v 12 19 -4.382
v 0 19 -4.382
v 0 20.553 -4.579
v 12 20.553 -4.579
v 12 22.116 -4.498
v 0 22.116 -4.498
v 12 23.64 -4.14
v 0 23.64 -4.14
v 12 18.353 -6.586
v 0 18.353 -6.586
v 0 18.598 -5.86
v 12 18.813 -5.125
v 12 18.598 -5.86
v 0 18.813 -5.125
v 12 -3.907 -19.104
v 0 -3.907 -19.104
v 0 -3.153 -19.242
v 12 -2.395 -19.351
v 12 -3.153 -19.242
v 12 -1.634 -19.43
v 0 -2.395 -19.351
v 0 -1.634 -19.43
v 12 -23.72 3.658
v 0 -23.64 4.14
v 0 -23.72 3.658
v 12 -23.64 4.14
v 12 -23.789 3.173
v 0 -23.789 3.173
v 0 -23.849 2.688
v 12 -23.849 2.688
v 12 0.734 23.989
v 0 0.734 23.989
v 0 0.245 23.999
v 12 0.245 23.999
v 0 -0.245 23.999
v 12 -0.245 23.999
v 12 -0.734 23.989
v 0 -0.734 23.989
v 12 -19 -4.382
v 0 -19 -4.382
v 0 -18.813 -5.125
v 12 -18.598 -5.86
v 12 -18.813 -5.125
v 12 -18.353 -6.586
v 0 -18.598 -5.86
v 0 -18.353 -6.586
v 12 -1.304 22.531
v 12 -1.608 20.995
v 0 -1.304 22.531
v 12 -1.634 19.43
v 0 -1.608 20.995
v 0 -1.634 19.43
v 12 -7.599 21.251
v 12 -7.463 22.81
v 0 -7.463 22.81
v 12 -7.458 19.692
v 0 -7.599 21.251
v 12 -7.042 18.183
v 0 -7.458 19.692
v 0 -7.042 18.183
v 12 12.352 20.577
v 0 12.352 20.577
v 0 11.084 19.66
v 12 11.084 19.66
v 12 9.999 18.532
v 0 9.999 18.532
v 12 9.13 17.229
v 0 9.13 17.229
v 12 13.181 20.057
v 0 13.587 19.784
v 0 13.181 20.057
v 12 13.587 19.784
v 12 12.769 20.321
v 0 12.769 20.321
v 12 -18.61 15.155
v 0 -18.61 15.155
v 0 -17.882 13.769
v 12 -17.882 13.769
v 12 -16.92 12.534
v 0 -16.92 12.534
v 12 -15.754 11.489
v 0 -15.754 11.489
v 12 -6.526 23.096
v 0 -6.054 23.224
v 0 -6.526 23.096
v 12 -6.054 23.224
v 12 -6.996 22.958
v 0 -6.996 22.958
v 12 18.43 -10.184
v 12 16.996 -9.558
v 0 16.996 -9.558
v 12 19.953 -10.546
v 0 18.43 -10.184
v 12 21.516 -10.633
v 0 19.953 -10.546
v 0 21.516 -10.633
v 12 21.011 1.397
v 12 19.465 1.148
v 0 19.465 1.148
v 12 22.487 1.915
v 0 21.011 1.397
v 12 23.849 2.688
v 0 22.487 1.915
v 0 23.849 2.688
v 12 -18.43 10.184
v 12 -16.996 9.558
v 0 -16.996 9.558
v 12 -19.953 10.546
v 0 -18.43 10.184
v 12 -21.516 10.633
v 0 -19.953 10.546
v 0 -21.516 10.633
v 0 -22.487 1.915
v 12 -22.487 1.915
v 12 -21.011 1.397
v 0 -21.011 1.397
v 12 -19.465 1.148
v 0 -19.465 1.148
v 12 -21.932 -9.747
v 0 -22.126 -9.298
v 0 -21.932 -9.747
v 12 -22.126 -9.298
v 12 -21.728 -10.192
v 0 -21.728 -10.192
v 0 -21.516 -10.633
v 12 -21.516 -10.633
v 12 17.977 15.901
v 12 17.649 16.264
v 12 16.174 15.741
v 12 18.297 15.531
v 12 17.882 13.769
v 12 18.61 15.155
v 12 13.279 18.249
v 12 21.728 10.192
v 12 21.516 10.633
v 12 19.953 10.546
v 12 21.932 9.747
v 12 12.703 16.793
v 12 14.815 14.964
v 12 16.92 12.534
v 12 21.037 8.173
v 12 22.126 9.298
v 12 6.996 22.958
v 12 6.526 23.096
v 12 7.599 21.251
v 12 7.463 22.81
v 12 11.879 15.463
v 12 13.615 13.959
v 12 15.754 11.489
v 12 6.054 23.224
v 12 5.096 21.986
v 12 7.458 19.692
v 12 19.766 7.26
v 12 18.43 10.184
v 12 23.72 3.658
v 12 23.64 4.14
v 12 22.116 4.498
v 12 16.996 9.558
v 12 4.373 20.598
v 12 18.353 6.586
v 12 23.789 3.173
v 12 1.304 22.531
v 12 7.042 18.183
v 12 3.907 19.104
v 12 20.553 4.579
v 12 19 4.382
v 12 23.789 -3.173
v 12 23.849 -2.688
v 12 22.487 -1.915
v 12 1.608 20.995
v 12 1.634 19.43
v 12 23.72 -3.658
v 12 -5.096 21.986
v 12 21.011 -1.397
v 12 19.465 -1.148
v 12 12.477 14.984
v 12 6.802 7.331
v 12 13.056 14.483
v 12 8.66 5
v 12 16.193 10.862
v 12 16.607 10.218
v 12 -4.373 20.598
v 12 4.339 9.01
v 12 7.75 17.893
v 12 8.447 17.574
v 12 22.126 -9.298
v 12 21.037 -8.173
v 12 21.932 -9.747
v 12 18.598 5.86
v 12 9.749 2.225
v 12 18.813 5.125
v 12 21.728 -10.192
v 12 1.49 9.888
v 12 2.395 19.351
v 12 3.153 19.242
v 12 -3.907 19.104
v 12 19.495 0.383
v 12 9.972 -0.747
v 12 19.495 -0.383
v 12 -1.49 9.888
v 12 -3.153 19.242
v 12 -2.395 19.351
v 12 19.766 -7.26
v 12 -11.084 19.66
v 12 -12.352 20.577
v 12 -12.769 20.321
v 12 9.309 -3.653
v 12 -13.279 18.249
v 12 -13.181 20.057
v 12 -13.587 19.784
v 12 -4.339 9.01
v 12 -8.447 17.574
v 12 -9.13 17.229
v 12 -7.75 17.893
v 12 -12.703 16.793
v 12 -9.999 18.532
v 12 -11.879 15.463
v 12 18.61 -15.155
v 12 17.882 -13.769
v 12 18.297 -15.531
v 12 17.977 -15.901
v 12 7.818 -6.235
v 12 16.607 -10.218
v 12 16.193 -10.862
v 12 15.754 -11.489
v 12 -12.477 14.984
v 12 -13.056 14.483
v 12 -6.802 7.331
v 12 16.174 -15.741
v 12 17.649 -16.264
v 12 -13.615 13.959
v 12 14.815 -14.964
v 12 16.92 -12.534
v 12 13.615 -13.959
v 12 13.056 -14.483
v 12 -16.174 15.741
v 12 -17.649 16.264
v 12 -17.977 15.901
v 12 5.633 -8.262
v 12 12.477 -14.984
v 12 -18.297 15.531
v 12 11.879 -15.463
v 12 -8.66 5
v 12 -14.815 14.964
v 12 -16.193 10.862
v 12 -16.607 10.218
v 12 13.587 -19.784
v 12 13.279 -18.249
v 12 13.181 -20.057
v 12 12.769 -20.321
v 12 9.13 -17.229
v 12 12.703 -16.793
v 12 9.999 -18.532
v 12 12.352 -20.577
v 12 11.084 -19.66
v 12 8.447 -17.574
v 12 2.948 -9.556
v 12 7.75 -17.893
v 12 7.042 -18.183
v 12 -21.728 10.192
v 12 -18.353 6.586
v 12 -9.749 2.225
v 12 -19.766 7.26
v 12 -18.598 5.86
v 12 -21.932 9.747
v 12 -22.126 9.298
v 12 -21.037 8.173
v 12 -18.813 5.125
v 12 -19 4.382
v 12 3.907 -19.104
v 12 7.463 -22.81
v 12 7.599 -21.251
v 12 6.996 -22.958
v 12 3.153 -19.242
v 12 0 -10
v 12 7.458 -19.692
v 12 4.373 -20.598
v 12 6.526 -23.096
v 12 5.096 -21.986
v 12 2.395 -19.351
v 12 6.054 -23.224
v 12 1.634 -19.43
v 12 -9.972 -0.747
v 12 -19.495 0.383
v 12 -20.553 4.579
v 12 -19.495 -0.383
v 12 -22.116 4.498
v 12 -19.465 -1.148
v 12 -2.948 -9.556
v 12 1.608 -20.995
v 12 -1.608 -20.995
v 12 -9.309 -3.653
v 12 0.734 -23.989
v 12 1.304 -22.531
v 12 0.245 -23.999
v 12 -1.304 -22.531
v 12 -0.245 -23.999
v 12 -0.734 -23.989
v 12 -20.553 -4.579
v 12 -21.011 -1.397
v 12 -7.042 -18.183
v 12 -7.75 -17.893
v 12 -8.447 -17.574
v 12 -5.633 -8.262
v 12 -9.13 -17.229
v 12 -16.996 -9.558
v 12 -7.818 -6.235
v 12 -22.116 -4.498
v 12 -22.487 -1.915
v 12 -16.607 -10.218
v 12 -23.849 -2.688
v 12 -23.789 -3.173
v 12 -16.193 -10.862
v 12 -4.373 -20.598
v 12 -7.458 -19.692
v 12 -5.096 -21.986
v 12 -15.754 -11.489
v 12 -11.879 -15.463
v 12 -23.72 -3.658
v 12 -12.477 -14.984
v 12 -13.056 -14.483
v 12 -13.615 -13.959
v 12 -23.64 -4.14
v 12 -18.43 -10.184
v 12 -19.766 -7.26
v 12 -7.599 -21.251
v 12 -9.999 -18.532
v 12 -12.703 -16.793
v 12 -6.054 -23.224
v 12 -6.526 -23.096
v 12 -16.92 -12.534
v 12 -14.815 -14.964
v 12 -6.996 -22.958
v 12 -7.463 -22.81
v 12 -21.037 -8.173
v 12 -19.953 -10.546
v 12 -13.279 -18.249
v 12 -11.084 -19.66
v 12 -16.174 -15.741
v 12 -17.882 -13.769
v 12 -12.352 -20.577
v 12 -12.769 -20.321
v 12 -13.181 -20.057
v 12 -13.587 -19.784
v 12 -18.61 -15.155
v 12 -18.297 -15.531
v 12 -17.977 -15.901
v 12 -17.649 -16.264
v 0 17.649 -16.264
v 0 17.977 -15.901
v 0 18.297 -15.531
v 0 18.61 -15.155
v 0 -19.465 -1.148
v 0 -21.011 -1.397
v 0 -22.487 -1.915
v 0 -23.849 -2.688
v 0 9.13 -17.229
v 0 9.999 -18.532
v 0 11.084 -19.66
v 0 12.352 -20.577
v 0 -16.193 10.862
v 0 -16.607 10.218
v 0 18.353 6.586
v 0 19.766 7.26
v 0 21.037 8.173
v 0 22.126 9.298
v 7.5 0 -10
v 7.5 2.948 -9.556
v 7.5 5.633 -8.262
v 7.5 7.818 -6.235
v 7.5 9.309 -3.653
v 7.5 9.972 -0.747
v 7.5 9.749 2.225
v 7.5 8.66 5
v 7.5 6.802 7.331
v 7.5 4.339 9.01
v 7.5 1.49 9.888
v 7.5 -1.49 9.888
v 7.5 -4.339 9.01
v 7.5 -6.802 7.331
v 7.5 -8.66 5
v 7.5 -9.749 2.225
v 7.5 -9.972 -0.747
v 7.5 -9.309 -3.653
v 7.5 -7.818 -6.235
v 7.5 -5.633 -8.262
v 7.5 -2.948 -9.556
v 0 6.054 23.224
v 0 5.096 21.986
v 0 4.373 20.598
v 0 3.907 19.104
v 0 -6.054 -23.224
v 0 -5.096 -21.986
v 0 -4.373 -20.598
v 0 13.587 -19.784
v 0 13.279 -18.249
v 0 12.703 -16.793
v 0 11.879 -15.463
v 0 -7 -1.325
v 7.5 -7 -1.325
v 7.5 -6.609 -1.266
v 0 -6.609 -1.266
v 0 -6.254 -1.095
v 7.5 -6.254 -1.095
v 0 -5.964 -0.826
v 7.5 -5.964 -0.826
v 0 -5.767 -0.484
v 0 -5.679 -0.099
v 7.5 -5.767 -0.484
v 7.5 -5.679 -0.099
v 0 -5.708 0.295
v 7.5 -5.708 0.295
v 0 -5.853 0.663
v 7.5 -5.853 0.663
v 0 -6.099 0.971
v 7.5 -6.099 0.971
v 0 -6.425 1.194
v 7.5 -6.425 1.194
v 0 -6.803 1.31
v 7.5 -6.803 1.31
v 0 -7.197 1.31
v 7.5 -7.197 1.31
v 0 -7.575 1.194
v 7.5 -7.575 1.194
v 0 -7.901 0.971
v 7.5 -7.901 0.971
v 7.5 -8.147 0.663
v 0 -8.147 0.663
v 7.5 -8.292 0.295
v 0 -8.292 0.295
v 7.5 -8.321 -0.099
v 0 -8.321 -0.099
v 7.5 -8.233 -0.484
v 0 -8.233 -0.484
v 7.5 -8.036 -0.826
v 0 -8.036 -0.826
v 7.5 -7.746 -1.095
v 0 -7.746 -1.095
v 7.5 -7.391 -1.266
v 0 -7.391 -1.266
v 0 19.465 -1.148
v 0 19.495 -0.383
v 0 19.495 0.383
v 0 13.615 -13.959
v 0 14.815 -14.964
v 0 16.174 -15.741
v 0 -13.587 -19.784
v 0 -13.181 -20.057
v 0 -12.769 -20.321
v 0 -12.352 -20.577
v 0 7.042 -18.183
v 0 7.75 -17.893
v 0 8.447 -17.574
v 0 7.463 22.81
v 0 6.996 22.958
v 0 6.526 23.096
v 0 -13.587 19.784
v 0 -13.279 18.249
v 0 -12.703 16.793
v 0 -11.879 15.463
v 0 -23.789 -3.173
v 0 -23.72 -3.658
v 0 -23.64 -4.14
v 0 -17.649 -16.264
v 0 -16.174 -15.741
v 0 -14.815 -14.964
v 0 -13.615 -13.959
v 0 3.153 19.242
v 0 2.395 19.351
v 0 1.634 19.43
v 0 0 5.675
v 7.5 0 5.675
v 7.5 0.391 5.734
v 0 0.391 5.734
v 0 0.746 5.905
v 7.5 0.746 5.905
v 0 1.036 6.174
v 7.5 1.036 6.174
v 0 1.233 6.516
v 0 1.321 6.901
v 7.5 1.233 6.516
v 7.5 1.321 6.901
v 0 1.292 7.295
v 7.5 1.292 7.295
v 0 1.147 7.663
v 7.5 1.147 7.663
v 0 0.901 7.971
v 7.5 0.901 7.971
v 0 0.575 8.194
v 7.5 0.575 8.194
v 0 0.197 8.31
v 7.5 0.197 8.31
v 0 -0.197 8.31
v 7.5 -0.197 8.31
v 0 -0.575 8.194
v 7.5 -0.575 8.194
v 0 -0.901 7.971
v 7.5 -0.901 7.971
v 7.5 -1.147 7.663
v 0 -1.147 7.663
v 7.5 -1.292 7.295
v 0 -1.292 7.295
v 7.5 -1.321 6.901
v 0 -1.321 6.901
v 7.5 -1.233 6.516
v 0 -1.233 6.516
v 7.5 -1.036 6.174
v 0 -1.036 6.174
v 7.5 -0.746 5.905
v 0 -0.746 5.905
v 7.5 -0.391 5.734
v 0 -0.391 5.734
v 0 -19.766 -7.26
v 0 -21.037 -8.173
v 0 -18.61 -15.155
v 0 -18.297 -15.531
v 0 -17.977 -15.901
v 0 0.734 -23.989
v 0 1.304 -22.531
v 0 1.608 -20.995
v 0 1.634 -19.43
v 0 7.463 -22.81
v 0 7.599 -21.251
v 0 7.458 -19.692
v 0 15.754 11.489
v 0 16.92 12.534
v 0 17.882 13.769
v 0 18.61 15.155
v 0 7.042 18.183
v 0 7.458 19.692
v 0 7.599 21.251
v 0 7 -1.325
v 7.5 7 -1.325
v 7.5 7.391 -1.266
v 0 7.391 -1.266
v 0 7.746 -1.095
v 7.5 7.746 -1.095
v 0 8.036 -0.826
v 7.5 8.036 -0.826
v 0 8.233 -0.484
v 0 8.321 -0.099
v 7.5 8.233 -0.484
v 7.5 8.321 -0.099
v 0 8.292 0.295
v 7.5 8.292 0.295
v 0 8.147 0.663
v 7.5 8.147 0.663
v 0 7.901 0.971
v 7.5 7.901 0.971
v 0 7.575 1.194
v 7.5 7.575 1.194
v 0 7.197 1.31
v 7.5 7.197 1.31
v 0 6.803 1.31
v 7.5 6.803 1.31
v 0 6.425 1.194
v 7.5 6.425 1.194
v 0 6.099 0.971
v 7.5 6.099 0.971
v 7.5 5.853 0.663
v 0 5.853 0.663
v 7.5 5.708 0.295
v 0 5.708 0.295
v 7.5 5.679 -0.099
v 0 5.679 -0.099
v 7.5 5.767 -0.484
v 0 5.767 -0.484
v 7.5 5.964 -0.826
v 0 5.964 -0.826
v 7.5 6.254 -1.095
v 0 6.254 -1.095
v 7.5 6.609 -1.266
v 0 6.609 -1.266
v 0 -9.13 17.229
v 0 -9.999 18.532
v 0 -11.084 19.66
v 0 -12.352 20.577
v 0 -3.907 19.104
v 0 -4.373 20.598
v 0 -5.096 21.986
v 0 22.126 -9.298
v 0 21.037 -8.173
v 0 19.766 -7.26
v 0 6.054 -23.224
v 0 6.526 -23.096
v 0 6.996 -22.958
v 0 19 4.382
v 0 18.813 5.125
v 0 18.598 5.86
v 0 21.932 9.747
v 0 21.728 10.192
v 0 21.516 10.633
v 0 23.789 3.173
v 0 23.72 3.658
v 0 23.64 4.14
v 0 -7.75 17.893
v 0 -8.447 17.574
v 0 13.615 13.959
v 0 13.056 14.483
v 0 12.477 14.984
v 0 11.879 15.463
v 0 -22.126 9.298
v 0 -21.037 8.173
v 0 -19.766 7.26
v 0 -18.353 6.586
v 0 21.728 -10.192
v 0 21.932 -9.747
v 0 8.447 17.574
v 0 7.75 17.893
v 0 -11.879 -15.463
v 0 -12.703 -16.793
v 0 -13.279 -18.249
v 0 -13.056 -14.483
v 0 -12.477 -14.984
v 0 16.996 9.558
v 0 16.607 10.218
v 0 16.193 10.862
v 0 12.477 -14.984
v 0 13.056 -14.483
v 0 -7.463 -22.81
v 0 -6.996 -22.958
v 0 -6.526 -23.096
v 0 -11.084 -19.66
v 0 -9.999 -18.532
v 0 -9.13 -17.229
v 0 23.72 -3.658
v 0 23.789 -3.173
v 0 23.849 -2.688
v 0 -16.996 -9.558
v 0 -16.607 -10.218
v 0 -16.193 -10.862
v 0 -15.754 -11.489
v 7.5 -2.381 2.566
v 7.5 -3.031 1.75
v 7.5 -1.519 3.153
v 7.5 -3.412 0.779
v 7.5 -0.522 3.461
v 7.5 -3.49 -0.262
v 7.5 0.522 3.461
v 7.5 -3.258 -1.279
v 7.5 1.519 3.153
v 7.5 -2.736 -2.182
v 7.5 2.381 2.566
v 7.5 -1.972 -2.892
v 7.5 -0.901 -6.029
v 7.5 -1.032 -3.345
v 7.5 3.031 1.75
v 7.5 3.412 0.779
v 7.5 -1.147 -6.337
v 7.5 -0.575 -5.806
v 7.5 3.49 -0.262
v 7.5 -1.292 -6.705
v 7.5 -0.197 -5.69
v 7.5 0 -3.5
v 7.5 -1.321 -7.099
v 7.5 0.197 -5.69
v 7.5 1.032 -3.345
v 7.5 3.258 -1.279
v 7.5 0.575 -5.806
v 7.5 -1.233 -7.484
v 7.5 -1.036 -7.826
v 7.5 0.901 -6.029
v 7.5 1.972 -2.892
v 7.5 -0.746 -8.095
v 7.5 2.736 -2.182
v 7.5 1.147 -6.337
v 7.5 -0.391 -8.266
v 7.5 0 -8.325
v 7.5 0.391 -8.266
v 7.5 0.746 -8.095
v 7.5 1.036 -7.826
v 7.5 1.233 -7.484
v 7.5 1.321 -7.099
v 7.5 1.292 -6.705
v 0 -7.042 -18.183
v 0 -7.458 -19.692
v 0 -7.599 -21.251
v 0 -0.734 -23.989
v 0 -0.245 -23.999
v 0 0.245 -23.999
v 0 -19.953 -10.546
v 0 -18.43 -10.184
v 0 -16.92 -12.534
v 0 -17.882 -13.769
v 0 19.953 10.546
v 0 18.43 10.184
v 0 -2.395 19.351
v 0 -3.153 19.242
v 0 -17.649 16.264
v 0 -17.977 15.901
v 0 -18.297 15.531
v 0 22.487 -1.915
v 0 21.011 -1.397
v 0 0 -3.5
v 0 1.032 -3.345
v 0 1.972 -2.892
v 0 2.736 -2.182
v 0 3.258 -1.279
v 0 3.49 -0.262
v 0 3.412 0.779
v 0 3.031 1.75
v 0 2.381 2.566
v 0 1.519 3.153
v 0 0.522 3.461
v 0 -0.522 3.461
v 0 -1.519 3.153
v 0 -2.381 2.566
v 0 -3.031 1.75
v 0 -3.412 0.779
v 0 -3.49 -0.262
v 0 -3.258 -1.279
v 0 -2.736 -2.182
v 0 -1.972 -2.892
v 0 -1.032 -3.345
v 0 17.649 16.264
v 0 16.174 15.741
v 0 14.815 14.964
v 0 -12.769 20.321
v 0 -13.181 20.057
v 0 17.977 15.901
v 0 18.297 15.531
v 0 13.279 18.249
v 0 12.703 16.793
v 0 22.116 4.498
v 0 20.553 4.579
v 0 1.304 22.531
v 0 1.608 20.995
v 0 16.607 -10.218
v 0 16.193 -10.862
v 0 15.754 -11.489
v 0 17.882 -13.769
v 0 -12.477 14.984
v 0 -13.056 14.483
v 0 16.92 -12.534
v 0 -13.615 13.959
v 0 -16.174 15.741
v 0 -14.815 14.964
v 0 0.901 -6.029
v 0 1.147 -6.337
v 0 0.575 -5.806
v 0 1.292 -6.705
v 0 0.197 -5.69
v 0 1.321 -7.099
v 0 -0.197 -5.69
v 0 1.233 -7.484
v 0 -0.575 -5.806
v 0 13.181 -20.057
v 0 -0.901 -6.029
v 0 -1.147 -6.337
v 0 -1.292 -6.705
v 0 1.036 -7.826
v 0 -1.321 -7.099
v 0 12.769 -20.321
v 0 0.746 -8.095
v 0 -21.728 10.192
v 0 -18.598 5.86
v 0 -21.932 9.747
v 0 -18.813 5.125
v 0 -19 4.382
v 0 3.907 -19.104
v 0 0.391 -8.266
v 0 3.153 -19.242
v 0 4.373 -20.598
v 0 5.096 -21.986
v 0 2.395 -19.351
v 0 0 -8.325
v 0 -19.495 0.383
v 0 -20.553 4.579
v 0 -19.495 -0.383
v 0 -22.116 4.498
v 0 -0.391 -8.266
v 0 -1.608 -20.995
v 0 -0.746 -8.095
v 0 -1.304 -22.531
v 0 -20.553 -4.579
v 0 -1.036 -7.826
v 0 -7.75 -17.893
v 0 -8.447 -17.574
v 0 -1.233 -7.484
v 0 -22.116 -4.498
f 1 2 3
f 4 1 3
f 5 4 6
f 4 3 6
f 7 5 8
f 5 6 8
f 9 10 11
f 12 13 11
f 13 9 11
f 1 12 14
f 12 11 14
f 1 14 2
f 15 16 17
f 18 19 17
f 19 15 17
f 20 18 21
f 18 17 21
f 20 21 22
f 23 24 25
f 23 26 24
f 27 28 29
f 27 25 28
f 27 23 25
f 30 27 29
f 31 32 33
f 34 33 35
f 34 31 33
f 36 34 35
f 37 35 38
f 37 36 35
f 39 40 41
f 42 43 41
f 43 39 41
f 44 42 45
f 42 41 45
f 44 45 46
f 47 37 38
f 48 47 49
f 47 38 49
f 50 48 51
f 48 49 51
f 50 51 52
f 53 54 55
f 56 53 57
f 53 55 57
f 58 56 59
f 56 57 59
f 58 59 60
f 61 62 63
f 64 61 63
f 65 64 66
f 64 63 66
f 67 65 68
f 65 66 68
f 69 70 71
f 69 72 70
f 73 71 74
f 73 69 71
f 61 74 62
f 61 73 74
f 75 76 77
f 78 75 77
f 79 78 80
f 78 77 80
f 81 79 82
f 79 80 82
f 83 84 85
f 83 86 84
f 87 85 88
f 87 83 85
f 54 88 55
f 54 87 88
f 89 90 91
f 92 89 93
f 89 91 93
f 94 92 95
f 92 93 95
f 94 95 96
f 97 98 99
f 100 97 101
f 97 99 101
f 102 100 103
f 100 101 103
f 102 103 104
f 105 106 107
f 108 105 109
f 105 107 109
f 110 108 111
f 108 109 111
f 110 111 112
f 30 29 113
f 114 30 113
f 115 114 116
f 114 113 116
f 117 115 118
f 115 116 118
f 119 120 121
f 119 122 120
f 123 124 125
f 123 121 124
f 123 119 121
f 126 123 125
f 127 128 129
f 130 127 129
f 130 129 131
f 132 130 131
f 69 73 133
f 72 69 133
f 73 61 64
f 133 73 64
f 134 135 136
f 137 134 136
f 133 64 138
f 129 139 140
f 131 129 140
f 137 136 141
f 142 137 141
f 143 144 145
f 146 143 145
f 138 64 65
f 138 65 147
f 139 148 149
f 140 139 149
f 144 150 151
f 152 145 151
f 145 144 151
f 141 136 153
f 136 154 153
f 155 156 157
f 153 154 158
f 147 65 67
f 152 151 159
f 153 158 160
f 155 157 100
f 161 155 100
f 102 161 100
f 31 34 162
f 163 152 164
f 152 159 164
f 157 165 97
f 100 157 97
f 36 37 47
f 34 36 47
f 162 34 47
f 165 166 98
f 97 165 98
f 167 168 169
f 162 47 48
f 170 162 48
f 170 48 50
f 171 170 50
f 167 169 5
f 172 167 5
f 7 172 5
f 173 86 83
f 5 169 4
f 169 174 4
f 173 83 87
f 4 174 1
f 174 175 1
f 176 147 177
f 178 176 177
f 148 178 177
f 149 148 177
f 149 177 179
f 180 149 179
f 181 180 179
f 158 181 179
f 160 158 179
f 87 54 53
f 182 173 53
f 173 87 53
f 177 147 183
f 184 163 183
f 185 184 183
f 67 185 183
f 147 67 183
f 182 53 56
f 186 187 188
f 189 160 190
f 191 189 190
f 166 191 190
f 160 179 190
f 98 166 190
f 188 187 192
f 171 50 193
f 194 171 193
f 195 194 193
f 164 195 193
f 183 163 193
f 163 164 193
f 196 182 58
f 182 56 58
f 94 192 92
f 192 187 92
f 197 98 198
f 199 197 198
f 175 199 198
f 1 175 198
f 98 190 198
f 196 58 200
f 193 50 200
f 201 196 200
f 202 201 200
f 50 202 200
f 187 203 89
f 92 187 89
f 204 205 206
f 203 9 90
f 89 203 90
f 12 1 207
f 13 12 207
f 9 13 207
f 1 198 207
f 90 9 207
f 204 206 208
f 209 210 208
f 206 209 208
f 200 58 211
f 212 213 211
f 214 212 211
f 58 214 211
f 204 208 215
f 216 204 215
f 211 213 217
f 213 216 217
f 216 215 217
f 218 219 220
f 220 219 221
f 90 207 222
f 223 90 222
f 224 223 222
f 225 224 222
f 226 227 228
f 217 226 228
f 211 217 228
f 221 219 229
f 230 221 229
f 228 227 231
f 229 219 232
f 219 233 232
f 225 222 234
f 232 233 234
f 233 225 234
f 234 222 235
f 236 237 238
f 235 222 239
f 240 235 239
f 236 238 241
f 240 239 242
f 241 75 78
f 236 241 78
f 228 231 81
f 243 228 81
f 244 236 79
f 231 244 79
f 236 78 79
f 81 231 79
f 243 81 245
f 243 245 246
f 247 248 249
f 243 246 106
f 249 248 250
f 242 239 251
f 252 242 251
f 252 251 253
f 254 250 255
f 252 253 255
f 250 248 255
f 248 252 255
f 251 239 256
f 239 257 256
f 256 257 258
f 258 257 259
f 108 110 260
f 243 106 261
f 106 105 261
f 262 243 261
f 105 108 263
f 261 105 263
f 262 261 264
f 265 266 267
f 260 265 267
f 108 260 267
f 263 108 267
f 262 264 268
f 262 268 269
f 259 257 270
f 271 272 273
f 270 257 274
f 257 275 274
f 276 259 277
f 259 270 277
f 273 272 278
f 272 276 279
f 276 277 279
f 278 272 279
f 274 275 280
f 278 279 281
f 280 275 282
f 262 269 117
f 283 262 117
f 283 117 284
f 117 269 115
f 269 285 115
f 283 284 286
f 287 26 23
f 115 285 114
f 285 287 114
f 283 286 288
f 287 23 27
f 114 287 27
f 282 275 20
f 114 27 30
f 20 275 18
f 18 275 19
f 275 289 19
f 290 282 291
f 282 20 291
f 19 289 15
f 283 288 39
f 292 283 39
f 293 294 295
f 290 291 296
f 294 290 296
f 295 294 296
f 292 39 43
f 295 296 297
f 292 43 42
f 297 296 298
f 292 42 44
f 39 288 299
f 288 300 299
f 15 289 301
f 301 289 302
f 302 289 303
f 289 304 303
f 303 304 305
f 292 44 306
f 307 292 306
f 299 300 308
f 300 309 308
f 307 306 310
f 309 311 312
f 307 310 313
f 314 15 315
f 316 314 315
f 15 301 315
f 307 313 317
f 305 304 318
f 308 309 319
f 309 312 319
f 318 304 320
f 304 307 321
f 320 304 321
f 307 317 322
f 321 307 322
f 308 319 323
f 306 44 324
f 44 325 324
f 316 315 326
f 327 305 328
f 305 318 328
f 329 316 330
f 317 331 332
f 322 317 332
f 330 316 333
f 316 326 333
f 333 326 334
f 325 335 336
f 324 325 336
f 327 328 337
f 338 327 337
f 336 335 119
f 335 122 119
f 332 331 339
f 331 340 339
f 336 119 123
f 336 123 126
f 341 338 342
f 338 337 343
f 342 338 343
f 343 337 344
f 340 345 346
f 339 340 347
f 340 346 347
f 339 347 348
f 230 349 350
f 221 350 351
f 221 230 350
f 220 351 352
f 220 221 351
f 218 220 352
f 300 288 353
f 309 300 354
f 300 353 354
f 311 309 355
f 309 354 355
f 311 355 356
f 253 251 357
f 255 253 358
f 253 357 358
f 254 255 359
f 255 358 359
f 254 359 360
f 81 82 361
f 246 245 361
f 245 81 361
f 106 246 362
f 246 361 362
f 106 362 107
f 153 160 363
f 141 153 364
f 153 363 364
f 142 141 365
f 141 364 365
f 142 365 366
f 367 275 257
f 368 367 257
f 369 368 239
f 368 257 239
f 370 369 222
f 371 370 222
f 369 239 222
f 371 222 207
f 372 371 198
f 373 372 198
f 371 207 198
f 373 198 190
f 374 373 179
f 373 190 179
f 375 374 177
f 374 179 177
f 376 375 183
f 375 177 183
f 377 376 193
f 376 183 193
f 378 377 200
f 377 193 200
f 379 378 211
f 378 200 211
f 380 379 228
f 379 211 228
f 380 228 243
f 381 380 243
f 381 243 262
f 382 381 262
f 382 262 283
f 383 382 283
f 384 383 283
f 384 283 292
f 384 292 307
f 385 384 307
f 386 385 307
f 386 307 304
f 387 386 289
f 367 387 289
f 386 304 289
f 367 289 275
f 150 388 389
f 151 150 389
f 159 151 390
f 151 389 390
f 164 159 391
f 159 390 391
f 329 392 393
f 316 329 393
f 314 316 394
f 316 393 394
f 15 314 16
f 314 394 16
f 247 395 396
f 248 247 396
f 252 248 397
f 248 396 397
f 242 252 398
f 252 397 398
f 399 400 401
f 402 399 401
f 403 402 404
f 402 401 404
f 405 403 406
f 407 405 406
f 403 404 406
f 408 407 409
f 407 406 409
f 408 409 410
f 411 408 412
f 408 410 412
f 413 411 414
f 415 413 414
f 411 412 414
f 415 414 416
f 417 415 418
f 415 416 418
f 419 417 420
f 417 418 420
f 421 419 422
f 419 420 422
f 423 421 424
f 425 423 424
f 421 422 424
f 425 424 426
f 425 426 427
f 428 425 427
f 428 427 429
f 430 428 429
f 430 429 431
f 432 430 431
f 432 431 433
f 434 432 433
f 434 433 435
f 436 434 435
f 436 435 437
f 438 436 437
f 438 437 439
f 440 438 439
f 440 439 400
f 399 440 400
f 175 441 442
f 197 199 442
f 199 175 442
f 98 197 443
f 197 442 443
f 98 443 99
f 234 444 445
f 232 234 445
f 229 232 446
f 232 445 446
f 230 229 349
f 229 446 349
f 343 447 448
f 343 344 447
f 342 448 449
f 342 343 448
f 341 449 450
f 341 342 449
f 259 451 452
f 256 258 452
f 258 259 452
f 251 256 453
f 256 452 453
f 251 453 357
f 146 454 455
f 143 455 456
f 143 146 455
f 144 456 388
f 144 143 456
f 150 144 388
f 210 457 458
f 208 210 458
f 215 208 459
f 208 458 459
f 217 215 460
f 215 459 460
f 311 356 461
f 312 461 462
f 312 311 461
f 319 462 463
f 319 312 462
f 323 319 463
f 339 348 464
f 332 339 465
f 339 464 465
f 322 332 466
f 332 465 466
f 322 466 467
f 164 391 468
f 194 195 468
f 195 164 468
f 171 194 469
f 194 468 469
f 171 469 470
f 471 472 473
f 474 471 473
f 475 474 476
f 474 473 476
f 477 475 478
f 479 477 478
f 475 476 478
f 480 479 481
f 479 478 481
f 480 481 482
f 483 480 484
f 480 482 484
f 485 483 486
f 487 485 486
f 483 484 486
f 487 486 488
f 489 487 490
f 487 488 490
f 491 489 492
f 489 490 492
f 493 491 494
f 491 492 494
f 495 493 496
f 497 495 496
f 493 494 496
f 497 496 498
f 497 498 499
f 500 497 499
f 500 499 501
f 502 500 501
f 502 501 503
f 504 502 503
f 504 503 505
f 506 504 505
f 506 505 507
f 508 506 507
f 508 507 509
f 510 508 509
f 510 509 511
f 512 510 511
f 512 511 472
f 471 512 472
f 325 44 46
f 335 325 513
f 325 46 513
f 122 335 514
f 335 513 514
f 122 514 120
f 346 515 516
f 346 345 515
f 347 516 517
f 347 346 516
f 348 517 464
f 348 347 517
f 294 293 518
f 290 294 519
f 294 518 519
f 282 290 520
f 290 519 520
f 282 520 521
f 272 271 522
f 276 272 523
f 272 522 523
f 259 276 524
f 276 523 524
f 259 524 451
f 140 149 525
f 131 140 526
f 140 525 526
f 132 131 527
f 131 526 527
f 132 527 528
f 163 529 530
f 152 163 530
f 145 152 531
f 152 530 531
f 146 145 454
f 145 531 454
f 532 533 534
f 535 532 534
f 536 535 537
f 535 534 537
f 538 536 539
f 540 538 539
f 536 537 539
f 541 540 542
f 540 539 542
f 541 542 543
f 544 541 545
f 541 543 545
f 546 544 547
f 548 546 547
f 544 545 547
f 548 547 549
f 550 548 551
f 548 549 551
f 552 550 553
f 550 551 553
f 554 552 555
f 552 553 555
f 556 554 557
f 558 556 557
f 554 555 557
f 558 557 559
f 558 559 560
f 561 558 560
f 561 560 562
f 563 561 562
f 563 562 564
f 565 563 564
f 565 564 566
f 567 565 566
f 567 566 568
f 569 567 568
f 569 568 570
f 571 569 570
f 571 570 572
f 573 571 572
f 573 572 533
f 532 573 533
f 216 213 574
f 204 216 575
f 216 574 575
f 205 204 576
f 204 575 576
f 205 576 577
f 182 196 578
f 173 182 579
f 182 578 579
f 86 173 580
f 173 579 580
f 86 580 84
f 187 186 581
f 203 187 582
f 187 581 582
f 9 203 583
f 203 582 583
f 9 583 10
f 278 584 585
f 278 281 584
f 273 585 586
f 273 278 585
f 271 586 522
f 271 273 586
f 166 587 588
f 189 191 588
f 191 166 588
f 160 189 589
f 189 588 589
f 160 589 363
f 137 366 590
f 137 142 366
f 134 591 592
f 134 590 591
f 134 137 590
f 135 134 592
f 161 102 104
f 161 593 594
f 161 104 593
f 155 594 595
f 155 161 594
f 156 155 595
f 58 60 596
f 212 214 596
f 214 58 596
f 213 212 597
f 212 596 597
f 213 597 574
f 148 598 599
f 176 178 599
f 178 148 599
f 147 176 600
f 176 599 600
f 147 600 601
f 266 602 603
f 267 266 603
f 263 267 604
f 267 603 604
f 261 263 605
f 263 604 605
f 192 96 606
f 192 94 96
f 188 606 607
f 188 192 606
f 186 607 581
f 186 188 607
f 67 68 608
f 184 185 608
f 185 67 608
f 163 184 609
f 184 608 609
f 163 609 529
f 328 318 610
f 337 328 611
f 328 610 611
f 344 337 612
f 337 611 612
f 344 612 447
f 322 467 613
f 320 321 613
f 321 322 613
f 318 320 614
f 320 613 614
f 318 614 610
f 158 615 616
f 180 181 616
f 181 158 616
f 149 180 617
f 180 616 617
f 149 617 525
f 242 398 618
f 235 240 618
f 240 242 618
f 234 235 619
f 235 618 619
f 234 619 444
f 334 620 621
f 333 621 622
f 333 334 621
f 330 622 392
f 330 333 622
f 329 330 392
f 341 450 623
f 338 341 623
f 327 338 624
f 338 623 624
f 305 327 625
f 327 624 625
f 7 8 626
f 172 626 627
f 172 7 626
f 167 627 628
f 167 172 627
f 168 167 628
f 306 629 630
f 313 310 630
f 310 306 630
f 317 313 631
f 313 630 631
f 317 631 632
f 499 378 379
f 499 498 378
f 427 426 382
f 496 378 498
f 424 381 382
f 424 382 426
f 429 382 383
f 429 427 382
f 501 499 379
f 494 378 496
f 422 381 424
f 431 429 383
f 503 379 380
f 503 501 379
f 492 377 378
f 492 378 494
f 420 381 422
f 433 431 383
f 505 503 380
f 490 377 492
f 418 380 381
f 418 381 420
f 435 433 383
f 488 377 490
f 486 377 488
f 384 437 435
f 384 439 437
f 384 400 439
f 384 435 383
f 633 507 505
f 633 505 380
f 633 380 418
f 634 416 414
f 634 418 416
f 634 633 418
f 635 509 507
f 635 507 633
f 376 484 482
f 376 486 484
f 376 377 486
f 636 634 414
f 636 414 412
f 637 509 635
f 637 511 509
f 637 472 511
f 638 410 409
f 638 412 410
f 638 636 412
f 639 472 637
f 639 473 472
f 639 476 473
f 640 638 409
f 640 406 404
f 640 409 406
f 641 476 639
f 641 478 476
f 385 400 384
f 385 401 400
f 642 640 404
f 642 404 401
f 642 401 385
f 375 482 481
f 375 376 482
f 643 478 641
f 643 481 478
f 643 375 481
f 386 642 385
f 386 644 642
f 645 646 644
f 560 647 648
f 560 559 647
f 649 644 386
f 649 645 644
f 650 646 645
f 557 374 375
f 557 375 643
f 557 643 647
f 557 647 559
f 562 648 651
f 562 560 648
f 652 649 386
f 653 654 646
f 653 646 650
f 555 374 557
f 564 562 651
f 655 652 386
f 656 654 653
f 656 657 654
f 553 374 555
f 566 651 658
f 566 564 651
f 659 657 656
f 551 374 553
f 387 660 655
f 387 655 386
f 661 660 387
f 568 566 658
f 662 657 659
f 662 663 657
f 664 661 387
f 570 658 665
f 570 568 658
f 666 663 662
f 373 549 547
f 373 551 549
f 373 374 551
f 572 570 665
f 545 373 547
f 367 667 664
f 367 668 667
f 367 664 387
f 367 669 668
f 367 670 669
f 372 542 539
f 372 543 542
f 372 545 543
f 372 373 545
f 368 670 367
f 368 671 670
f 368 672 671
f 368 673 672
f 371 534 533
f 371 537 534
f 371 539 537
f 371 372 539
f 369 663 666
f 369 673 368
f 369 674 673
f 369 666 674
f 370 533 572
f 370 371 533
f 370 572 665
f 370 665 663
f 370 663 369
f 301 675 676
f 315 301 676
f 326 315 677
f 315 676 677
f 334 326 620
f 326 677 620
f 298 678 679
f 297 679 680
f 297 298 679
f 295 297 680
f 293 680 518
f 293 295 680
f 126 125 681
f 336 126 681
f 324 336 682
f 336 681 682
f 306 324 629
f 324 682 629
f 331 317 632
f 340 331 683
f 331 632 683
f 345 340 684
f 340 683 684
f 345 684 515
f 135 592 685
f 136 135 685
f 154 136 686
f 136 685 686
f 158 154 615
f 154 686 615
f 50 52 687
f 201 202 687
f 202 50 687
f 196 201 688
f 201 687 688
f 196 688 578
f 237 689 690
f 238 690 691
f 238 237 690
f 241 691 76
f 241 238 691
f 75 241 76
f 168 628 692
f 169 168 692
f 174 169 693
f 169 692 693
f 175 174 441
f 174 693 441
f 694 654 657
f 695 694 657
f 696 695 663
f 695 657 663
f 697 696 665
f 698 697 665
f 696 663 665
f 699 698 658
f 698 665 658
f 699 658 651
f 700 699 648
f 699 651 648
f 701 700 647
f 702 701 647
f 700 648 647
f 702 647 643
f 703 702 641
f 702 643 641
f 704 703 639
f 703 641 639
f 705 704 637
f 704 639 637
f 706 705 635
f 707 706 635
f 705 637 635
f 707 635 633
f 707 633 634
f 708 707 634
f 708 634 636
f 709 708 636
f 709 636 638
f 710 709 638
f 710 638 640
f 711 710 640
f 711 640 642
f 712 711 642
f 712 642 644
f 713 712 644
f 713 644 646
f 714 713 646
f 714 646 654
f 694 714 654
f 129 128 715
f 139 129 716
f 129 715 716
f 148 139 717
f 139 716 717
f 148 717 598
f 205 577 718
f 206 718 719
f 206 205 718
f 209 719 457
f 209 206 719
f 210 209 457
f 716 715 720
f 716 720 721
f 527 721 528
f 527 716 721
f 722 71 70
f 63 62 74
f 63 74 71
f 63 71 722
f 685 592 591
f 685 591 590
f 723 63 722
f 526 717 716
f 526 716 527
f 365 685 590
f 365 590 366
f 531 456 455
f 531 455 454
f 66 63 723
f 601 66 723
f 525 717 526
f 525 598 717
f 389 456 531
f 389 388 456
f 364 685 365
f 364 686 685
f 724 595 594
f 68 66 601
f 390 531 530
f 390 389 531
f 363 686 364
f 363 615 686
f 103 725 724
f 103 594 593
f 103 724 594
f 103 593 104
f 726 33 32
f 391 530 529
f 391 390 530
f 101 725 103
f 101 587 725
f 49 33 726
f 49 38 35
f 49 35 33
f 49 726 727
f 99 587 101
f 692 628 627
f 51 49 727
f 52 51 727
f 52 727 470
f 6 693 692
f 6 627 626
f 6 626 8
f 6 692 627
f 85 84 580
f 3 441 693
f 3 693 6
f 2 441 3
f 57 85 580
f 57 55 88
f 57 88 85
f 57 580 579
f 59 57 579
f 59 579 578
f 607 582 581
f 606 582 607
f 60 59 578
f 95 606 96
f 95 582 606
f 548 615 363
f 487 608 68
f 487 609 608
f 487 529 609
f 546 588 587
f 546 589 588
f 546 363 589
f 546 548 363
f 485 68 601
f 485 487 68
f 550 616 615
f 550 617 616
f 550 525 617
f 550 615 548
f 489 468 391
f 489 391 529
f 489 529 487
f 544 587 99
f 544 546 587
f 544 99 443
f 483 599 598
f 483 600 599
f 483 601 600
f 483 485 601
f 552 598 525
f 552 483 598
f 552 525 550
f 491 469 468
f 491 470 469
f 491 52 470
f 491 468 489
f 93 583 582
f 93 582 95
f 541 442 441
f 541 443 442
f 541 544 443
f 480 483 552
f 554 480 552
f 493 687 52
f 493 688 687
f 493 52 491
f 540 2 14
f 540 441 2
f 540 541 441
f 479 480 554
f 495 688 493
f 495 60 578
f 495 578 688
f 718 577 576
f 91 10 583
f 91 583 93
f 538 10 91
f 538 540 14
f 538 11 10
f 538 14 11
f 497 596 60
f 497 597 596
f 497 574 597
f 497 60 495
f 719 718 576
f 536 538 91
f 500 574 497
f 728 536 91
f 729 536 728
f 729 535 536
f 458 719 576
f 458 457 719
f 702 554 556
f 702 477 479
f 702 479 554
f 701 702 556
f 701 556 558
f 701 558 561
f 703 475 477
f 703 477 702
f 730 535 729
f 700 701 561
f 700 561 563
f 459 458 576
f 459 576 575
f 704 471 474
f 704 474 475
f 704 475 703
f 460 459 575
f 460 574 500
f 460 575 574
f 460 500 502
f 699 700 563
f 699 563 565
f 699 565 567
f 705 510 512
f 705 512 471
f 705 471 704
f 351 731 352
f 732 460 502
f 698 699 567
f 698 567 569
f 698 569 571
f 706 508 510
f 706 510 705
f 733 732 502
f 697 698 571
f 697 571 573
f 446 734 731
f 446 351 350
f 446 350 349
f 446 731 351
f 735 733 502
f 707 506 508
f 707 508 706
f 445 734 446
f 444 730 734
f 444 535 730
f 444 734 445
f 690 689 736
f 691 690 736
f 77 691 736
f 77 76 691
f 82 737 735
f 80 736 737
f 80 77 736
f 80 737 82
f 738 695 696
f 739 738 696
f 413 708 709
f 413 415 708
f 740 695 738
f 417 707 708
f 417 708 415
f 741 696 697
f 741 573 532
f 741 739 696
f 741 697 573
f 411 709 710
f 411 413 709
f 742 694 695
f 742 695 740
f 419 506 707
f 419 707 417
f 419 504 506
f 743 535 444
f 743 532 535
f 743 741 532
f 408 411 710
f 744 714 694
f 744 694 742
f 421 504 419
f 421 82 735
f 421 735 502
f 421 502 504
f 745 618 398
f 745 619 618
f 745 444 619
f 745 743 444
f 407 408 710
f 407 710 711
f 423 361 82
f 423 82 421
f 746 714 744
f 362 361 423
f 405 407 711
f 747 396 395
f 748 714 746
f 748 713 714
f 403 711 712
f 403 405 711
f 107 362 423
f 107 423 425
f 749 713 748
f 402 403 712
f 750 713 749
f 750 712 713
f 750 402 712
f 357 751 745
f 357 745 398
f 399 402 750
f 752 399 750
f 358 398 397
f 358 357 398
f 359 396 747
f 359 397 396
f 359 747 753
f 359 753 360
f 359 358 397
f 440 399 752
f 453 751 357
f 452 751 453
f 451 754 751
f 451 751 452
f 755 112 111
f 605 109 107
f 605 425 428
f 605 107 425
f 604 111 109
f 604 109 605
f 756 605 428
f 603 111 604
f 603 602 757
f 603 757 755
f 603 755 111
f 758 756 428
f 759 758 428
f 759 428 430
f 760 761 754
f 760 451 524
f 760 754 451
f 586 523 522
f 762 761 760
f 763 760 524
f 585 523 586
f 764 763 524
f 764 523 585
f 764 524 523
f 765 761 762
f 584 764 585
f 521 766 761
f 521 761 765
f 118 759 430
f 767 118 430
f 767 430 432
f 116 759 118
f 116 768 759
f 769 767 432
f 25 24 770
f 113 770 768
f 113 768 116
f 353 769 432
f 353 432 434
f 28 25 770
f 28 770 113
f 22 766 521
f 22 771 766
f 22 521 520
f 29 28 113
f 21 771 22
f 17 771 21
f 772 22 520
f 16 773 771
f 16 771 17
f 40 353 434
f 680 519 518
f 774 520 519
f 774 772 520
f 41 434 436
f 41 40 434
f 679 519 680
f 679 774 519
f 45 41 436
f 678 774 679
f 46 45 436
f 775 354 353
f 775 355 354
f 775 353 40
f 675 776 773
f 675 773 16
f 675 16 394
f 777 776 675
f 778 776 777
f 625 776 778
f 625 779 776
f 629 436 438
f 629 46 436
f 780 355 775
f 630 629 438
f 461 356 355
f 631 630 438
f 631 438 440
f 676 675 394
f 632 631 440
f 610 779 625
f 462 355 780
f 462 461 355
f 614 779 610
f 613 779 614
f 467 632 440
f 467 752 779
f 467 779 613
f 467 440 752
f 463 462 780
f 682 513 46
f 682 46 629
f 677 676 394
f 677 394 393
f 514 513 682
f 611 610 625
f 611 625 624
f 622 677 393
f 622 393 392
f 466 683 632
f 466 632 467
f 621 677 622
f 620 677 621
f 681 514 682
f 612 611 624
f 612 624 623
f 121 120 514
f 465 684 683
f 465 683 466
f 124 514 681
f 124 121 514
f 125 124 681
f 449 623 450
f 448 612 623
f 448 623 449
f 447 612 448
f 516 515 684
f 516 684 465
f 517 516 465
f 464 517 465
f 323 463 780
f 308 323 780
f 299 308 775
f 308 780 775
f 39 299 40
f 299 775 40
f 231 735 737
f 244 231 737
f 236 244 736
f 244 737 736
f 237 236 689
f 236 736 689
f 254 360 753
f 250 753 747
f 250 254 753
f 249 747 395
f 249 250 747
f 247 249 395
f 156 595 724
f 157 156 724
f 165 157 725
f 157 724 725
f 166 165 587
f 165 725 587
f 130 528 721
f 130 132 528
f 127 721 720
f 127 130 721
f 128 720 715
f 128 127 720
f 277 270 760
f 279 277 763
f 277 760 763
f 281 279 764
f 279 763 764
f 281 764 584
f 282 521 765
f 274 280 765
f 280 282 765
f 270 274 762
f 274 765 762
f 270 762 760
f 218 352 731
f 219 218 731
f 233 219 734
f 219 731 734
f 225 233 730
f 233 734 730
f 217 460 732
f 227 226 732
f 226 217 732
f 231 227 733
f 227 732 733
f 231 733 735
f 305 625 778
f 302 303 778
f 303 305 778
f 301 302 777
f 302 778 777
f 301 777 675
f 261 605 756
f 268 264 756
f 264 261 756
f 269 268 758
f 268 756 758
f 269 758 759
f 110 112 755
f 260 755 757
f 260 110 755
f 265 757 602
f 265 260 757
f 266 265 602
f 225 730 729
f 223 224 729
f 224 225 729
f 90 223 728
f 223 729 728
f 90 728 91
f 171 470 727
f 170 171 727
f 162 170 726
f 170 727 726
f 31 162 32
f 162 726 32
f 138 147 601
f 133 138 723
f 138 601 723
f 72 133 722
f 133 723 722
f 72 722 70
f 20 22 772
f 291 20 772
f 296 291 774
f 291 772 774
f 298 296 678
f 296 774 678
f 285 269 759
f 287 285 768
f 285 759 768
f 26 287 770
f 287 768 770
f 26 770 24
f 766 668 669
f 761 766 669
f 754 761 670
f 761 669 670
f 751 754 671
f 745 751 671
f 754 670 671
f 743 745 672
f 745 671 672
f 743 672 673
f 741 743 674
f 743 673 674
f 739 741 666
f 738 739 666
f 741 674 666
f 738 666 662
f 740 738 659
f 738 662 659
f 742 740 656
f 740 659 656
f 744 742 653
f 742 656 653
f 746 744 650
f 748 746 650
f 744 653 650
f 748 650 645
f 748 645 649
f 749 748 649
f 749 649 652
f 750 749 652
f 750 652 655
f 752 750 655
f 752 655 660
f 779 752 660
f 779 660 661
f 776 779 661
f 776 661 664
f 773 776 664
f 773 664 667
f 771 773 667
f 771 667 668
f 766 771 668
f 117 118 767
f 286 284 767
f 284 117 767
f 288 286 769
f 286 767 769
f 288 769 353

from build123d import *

# Parameters (mm, degrees)
BASPROSKE_W        = 12
BASPROSKE_H        = 24
TOOTHCUT_DEPTH     = 37
TEETHCUTS_COUNT    = 22
TEETHCUTS_ANGLE    = 343.636363636
BORSKE_R           = 3
BORE_DEPTH         = 50.0000508
SKETCH1_R          = 10
CUT_EXTRUDE1_DEPTH = 4.5
CUT_EXTRUDE2_REACH = 36.656
SKETCH2_R          = 3.5
CUT_EXTRUDE3_REACH = 36.656
SKETCH3_R          = 1.325


with BuildPart() as part:
    # BasProSke → Base-Revolve (revolve)
    with BuildSketch(Plane(origin=(0, 0, 0), x_dir=(1, 0, 0), z_dir=(0, 1, 0)), mode=Mode.PRIVATE) as base_revolve_sk:
        with Locations((6, 12)):
            Rectangle(BASPROSKE_W, BASPROSKE_H)
    revolve(base_revolve_sk.sketch.rotate(Axis((-10, 0, 0), (1, 0, 0)), 180), axis=Axis((-10, 0, 0), (1, 0, 0)))

    # TooCutSke → ToothCut (cut, through all)
    with BuildSketch(Plane(origin=(0, 0, 0), x_dir=(0, 0, -1), z_dir=(1, 0, 0))):
        with BuildLine():
            ThreePointArc((1.148067356, 19.465172549), (0, 19.499), (-1.148067356, 19.465172549))
            ThreePointArc((-1.148067356, 19.465172549), (-1.628029232, 21.774154728), (-2.703966408, 23.872754571))
            ThreePointArc((-2.703966408, 23.872754571), (0, 24.0254), (2.703966408, 23.872754571))
            ThreePointArc((2.703966408, 23.872754571), (1.628029232, 21.774154728), (1.148067356, 19.465172549))
        make_face()
    toothcut = extrude(amount=TOOTHCUT_DEPTH, mode=Mode.SUBTRACT)

    # TeethCuts: ToothCut ×22 about axis
    teethcuts_axis = Axis((-10, 0, 0), (1, 0, 0))
    for i in range(1, TEETHCUTS_COUNT):
        add(toothcut.rotate(teethcuts_axis, i * TEETHCUTS_ANGLE / (TEETHCUTS_COUNT - 1)), mode=Mode.SUBTRACT)

    # BorSke → Bore (cut, symmetric)
    with BuildSketch(Plane(origin=(0, 0, 0), x_dir=(0, 0, -1), z_dir=(1, 0, 0))):
        with Locations(Location((0, 0, 0), (0, 0, 180))):
            Circle(BORSKE_R)
    extrude(amount=BORE_DEPTH, both=True, mode=Mode.SUBTRACT)

    # Sketch1 → Cut-Extrude1 (cut)
    with BuildSketch(Plane(origin=(12, 0, 0), x_dir=(0, 0, -1), z_dir=(1, 0, 0))):
        Circle(SKETCH1_R)
    extrude(amount=-CUT_EXTRUDE1_DEPTH, mode=Mode.SUBTRACT)

    # Sketch2 → Cut-Extrude2 (cut, up to next)
    with BuildSketch(Plane(origin=(7.5, 0, 0), x_dir=(0, 0, -1), z_dir=(1, 0, 0)), mode=Mode.PRIVATE) as cut_extrude2_sk1:
        Circle(SKETCH2_R)
    cut_extrude2_tool1 = extrude(cut_extrude2_sk1.sketch, amount=-CUT_EXTRUDE2_REACH, mode=Mode.PRIVATE) & part.part
    add(cut_extrude2_tool1.solids().sort_by_distance((7.5, 0, 0))[0], mode=Mode.SUBTRACT)

    # Sketch3 → Cut-Extrude3 (cut, up to next)
    with BuildSketch(Plane(origin=(7.5, 0, 0), x_dir=(0, 0, -1), z_dir=(1, 0, 0)), mode=Mode.PRIVATE) as cut_extrude3_sk1:
        with Locations((0, 7)):
            Circle(SKETCH3_R)
    cut_extrude3_tool1 = extrude(cut_extrude3_sk1.sketch, amount=-CUT_EXTRUDE3_REACH, mode=Mode.PRIVATE) & part.part
    # Sketch3 → Cut-Extrude3 (cut, up to next)
    with BuildSketch(Plane(origin=(7.5, 0, 0), x_dir=(0, 0, -1), z_dir=(1, 0, 0)), mode=Mode.PRIVATE) as cut_extrude3_sk2:
        with Locations((7, 0)):
            Circle(SKETCH3_R)
    cut_extrude3_tool2 = extrude(cut_extrude3_sk2.sketch, amount=-CUT_EXTRUDE3_REACH, mode=Mode.PRIVATE) & part.part
    # Sketch3 → Cut-Extrude3 (cut, up to next)
    with BuildSketch(Plane(origin=(7.5, 0, 0), x_dir=(0, 0, -1), z_dir=(1, 0, 0)), mode=Mode.PRIVATE) as cut_extrude3_sk3:
        with Locations((0, -7)):
            Circle(SKETCH3_R)
    cut_extrude3_tool3 = extrude(cut_extrude3_sk3.sketch, amount=-CUT_EXTRUDE3_REACH, mode=Mode.PRIVATE) & part.part
    # Sketch3 → Cut-Extrude3 (cut, up to next)
    with BuildSketch(Plane(origin=(7.5, 0, 0), x_dir=(0, 0, -1), z_dir=(1, 0, 0)), mode=Mode.PRIVATE) as cut_extrude3_sk4:
        with Locations((-7, 0)):
            Circle(SKETCH3_R)
    cut_extrude3_tool4 = extrude(cut_extrude3_sk4.sketch, amount=-CUT_EXTRUDE3_REACH, mode=Mode.PRIVATE) & part.part
    add(cut_extrude3_tool1.solids().sort_by_distance((7.5, 7, 0))[0], mode=Mode.SUBTRACT)
    add(cut_extrude3_tool2.solids().sort_by_distance((7.5, 0, -7))[0], mode=Mode.SUBTRACT)
    add(cut_extrude3_tool3.solids().sort_by_distance((7.5, -7, 0))[0], mode=Mode.SUBTRACT)
    add(cut_extrude3_tool4.solids().sort_by_distance((7.5, 0, 7))[0], mode=Mode.SUBTRACT)


solid = part.part
